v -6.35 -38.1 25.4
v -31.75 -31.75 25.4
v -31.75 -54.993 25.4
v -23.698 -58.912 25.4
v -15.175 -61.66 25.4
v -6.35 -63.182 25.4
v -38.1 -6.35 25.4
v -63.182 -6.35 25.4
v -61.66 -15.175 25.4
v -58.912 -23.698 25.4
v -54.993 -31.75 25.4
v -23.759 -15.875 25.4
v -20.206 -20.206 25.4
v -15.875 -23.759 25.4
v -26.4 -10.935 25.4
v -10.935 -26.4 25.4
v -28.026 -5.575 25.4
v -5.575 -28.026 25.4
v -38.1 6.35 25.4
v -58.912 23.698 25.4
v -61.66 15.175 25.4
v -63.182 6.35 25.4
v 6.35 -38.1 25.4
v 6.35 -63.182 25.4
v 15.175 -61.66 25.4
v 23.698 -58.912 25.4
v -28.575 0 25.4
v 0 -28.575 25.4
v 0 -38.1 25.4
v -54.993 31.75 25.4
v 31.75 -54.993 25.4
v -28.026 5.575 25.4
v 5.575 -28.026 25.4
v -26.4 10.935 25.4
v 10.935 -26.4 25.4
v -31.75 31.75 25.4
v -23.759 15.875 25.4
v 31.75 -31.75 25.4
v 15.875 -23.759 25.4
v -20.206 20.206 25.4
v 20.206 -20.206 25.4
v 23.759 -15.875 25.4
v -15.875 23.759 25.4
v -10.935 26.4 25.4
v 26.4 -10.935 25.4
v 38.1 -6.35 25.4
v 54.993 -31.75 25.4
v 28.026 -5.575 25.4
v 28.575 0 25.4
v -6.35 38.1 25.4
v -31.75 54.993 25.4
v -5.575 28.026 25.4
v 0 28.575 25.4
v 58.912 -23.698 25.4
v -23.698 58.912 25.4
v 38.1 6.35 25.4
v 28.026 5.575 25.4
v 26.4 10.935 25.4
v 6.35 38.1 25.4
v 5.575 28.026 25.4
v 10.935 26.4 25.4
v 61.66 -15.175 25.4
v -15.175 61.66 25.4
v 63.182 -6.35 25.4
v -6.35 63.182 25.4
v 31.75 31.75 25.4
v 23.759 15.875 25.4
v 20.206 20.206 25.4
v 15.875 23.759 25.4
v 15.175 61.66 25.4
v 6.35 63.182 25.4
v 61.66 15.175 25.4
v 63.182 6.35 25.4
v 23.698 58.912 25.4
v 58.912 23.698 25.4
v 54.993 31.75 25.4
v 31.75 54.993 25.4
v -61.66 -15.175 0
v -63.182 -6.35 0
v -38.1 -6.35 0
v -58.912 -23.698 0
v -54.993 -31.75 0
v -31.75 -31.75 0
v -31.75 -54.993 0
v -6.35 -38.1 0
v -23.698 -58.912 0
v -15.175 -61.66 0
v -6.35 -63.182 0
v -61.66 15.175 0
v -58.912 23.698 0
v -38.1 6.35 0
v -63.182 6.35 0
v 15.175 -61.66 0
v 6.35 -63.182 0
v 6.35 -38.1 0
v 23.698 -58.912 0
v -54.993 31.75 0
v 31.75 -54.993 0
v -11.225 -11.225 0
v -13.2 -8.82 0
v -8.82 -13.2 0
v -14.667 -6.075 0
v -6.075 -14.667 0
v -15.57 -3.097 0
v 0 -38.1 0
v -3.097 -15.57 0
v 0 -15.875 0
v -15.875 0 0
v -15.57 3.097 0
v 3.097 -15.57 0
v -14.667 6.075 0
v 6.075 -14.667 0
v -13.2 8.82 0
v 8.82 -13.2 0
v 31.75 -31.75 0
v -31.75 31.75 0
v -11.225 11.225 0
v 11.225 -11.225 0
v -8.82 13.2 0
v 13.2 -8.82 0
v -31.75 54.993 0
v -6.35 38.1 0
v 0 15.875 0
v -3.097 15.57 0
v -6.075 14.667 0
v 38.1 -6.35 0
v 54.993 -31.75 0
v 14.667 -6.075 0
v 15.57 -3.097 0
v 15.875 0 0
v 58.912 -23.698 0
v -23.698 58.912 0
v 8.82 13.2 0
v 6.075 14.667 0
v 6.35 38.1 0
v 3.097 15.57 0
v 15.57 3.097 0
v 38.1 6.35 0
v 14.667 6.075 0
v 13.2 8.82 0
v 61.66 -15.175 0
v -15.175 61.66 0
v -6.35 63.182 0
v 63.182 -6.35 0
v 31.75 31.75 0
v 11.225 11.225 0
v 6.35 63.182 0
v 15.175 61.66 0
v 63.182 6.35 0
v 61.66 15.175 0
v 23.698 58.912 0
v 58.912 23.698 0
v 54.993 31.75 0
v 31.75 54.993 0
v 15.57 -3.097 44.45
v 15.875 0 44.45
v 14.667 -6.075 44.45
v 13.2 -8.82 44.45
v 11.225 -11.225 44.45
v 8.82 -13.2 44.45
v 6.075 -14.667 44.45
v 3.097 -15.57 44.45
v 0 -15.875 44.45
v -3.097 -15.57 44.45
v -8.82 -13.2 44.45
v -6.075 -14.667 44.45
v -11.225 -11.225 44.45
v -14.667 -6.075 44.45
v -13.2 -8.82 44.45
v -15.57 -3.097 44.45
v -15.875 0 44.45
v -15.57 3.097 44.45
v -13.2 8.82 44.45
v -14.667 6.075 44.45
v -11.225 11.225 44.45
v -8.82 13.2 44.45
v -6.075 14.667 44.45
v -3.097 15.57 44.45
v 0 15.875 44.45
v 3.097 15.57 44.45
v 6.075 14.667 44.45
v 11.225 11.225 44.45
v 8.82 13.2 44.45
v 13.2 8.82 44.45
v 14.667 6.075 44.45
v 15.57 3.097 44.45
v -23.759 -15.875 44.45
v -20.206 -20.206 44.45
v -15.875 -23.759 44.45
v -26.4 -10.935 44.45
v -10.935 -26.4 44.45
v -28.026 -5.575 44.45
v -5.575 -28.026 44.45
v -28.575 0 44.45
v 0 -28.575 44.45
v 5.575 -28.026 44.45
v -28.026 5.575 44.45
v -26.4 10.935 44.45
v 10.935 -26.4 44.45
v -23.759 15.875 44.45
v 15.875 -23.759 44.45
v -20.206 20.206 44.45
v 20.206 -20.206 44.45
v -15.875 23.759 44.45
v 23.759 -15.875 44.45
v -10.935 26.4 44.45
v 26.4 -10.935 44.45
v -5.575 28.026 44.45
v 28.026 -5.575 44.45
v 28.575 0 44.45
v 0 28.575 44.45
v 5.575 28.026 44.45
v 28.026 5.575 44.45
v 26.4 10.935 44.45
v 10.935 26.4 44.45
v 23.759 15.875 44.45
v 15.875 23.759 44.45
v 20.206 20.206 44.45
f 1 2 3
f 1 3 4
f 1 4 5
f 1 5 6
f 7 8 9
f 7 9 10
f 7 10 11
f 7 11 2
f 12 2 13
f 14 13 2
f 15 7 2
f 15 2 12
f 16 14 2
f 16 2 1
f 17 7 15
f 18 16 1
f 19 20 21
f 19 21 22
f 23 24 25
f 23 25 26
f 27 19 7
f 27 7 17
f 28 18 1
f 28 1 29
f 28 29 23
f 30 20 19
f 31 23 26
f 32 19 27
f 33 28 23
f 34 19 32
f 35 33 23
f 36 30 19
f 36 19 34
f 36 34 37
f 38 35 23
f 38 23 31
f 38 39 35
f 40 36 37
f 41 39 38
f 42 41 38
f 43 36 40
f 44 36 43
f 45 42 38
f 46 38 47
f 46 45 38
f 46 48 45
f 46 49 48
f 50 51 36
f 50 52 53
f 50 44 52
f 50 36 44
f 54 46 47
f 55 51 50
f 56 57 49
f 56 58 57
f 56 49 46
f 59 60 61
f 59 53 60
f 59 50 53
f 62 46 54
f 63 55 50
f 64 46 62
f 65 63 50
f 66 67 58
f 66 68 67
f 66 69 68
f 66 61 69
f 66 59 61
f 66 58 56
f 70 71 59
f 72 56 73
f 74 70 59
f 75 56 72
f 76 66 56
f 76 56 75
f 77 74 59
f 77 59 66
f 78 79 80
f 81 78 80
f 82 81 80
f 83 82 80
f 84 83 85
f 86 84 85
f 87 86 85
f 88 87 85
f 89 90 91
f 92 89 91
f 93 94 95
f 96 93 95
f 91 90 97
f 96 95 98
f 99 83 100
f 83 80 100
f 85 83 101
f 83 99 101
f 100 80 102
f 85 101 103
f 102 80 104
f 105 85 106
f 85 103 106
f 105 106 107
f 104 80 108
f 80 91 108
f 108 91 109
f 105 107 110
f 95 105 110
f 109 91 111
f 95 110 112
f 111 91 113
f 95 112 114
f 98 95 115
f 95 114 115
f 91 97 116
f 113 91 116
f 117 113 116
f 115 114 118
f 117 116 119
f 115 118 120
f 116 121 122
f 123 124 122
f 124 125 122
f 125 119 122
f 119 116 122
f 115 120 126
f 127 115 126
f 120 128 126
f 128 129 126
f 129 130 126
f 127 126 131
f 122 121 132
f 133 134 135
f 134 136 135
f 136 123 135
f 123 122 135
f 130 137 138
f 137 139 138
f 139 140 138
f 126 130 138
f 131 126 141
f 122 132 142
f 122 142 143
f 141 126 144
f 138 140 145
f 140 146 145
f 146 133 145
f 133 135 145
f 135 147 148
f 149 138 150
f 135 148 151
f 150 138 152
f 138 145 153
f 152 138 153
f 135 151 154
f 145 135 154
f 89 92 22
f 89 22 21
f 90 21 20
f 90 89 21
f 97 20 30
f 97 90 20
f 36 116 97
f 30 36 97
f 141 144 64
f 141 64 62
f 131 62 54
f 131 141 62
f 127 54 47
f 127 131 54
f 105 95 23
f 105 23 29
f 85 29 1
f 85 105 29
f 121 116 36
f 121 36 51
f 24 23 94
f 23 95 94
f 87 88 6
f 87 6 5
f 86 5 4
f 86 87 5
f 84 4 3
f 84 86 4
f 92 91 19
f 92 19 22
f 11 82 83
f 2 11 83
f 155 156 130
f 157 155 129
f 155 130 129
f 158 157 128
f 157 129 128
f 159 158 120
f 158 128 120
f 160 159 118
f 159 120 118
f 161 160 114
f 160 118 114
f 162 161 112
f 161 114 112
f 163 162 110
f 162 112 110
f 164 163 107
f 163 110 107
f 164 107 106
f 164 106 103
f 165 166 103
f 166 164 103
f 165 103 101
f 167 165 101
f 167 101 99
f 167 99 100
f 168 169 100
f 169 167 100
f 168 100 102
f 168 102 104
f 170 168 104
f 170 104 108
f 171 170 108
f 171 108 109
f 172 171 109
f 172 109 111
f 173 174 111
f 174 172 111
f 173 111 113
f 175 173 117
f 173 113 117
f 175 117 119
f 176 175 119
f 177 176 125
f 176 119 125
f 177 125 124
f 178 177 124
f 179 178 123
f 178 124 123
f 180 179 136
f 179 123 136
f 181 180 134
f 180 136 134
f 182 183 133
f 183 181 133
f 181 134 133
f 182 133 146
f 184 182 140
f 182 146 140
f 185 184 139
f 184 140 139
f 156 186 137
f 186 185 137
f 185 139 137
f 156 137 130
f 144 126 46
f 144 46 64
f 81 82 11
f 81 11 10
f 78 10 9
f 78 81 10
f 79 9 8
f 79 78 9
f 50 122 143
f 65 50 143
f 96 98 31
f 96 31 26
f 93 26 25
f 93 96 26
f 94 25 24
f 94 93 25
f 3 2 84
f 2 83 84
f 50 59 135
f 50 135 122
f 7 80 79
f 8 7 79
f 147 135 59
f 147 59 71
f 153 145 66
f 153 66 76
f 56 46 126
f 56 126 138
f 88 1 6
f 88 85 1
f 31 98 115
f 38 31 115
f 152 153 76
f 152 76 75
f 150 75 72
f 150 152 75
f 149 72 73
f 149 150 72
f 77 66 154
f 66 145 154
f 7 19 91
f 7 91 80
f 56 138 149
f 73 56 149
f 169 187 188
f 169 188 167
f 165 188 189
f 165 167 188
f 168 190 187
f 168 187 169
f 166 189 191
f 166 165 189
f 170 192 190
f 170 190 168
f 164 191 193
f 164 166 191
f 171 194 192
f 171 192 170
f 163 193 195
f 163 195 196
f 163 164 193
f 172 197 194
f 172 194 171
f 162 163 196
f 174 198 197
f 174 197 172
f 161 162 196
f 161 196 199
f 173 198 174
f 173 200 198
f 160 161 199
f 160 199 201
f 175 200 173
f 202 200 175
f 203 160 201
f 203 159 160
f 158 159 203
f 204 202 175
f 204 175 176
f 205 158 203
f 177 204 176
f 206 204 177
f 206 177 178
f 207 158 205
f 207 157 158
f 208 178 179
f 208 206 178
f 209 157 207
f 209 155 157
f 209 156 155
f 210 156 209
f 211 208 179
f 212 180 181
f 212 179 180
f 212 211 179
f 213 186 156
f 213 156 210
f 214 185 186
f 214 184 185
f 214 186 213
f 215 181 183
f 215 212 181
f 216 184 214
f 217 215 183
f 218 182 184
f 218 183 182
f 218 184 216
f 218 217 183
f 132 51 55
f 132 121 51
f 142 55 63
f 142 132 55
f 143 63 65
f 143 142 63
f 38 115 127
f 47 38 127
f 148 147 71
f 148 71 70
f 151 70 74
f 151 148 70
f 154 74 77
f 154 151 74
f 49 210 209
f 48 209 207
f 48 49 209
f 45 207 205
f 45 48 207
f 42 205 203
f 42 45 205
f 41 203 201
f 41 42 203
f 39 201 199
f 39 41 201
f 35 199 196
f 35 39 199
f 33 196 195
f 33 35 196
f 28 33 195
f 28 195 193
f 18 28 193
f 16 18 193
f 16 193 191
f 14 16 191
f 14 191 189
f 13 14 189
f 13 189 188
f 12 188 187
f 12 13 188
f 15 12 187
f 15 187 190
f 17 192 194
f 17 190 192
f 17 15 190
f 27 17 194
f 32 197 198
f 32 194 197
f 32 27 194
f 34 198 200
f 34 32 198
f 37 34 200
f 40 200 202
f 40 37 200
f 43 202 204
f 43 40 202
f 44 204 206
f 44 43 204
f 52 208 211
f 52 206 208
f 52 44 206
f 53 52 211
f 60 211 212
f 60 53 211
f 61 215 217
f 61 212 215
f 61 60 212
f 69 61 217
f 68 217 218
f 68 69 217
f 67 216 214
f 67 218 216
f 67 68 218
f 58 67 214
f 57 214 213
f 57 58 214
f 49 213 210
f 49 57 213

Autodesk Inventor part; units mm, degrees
ref_plane "YZ Plane" through (0, 0, 0) normal (1, 0, 0) x (0, 1, 0)
ref_plane "XZ Plane" through (0, 0, 0) normal (0, 1, 0) x (-1, 0, 0)
ref_plane "XY Plane" through (0, 0, 0) normal (0, 0, 1) x (1, 0, 0)
sketch "Sketch1" plane through (0, 0, 0) normal (0, 0, 1) x (1, 0, 0)
  circle A0 centre (0, 0) radius 15.875
  line L0 (-38.1, 0) -> (-38.1, -6.35)
  line L1 (-38.1, 0) -> (-38.1, 6.35)
  line L2 (38.1, 0) -> (38.1, 6.35)
  line L3 (38.1, 0) -> (38.1, -6.35)
  line L4 (-38.1, 6.35) -> (-63.1817, 6.35)
  line L5 (-38.1, -6.35) -> (-63.1817, -6.35)
  line L6 (38.1, 6.35) -> (63.1817, 6.35)
  line L7 (38.1, -6.35) -> (63.1817, -6.35)
  line L8 (0, 38.1) -> (6.35, 38.1)
  line L9 (6.35, 38.1) -> (6.35, 63.1817)
  line L10 (0, 38.1) -> (-6.35, 38.1)
  line L11 (-6.35, 38.1) -> (-6.35, 63.1817)
  line L12 (0, 0) -> (0, -38.1)
  line L13 (0, -38.1) -> (6.35, -38.1)
  line L14 (0, -38.1) -> (-6.35, -38.1)
  line L15 (-6.35, -38.1) -> (-6.35, -63.1817)
  line L16 (6.35, -38.1) -> (6.35, -63.1817)
  line L17 (-31.75, 38.1) -> (-31.75, 54.9926)
  line L18 (31.75, 38.1) -> (31.75, 54.9926)
  line L19 (38.1, 31.75) -> (54.9926, 31.75)
  line L20 (38.1, -31.75) -> (54.9926, -31.75)
  line L21 (31.75, -38.1) -> (31.75, -54.9926)
  line L22 (-31.75, -38.1) -> (-31.75, -54.9926)
  line L23 (-38.1, 31.75) -> (-54.9926, 31.75)
  line L24 (-38.1, -31.75) -> (-54.9926, -31.75)
  line L25 (-38.1, -31.75) -> (-31.75, -31.75)
  line L26 (-31.75, -31.75) -> (-31.75, -38.1)
  line L27 (31.75, -38.1) -> (31.75, -31.75)
  line L28 (31.75, -31.75) -> (38.1, -31.75)
  arc A1 (-6.35, 63.1817) -> (-31.75, 54.9926) centre (0, 0) ccw
  arc A2 (31.75, 54.9926) -> (6.35, 63.1817) centre (0, 0) ccw
  arc A3 (63.1817, 6.35) -> (54.9926, 31.75) centre (0, 0) ccw
  arc A4 (6.35, -63.1817) -> (31.75, -54.9926) centre (0, 0) ccw
  arc A5 (54.9926, -31.75) -> (63.1817, -6.35) centre (0, 0) ccw
  arc A6 (-31.75, -54.9926) -> (-6.35, -63.1817) centre (0, 0) ccw
  arc A7 (-54.9926, 31.75) -> (-63.1817, 6.35) centre (0, 0) ccw
  arc A8 (-63.1817, -6.35) -> (-54.9926, -31.75) centre (0, 0) ccw
  line L29 (31.75, 38.1) -> (31.75, 31.75)
  line L30 (31.75, 31.75) -> (38.1, 31.75)
  line L31 (-38.1, 31.75) -> (-31.75, 31.75)
  line L32 (-31.75, 31.75) -> (-31.75, 38.1)
  dimension "d6" = 31.75
  dimension "d7" = 38.1
  dimension "d8" = 38.1
  dimension "d9" = 6.35
  dimension "d10" = 6.35
  dimension "d11" = 6.35
  dimension "d12" = 6.35
  dimension "d14" = 6.35
  dimension "d15" = 6.35
  dimension "d16" = 38.1
  dimension "d17" = 6.35
  dimension "d18" = 25.4
  dimension "d19" = 25.4
  dimension "d20" = 25.4
  dimension "d22" = 25.4
  dimension "d23" = 25.4
  dimension "d24" = 25.4
  dimension "d25" = 25.4
extrude "Extrusion1" add sketch "Sketch1" along normal blind 25.4
sketch "Sketch2" plane through (0, 0, 25.4) normal (0, 0, 1) x (1, 0, 0)
  circle A0 centre (0, 0) radius 15.875
  circle A1 centre (0, 0) radius 28.575
  dimension "d28" = 31.75
  dimension "d29" = 57.15
extrude "Extrusion2" add sketch "Sketch2" along normal blind 19.05
properties part number "Assignment 3.5 - Indexing Guide"
